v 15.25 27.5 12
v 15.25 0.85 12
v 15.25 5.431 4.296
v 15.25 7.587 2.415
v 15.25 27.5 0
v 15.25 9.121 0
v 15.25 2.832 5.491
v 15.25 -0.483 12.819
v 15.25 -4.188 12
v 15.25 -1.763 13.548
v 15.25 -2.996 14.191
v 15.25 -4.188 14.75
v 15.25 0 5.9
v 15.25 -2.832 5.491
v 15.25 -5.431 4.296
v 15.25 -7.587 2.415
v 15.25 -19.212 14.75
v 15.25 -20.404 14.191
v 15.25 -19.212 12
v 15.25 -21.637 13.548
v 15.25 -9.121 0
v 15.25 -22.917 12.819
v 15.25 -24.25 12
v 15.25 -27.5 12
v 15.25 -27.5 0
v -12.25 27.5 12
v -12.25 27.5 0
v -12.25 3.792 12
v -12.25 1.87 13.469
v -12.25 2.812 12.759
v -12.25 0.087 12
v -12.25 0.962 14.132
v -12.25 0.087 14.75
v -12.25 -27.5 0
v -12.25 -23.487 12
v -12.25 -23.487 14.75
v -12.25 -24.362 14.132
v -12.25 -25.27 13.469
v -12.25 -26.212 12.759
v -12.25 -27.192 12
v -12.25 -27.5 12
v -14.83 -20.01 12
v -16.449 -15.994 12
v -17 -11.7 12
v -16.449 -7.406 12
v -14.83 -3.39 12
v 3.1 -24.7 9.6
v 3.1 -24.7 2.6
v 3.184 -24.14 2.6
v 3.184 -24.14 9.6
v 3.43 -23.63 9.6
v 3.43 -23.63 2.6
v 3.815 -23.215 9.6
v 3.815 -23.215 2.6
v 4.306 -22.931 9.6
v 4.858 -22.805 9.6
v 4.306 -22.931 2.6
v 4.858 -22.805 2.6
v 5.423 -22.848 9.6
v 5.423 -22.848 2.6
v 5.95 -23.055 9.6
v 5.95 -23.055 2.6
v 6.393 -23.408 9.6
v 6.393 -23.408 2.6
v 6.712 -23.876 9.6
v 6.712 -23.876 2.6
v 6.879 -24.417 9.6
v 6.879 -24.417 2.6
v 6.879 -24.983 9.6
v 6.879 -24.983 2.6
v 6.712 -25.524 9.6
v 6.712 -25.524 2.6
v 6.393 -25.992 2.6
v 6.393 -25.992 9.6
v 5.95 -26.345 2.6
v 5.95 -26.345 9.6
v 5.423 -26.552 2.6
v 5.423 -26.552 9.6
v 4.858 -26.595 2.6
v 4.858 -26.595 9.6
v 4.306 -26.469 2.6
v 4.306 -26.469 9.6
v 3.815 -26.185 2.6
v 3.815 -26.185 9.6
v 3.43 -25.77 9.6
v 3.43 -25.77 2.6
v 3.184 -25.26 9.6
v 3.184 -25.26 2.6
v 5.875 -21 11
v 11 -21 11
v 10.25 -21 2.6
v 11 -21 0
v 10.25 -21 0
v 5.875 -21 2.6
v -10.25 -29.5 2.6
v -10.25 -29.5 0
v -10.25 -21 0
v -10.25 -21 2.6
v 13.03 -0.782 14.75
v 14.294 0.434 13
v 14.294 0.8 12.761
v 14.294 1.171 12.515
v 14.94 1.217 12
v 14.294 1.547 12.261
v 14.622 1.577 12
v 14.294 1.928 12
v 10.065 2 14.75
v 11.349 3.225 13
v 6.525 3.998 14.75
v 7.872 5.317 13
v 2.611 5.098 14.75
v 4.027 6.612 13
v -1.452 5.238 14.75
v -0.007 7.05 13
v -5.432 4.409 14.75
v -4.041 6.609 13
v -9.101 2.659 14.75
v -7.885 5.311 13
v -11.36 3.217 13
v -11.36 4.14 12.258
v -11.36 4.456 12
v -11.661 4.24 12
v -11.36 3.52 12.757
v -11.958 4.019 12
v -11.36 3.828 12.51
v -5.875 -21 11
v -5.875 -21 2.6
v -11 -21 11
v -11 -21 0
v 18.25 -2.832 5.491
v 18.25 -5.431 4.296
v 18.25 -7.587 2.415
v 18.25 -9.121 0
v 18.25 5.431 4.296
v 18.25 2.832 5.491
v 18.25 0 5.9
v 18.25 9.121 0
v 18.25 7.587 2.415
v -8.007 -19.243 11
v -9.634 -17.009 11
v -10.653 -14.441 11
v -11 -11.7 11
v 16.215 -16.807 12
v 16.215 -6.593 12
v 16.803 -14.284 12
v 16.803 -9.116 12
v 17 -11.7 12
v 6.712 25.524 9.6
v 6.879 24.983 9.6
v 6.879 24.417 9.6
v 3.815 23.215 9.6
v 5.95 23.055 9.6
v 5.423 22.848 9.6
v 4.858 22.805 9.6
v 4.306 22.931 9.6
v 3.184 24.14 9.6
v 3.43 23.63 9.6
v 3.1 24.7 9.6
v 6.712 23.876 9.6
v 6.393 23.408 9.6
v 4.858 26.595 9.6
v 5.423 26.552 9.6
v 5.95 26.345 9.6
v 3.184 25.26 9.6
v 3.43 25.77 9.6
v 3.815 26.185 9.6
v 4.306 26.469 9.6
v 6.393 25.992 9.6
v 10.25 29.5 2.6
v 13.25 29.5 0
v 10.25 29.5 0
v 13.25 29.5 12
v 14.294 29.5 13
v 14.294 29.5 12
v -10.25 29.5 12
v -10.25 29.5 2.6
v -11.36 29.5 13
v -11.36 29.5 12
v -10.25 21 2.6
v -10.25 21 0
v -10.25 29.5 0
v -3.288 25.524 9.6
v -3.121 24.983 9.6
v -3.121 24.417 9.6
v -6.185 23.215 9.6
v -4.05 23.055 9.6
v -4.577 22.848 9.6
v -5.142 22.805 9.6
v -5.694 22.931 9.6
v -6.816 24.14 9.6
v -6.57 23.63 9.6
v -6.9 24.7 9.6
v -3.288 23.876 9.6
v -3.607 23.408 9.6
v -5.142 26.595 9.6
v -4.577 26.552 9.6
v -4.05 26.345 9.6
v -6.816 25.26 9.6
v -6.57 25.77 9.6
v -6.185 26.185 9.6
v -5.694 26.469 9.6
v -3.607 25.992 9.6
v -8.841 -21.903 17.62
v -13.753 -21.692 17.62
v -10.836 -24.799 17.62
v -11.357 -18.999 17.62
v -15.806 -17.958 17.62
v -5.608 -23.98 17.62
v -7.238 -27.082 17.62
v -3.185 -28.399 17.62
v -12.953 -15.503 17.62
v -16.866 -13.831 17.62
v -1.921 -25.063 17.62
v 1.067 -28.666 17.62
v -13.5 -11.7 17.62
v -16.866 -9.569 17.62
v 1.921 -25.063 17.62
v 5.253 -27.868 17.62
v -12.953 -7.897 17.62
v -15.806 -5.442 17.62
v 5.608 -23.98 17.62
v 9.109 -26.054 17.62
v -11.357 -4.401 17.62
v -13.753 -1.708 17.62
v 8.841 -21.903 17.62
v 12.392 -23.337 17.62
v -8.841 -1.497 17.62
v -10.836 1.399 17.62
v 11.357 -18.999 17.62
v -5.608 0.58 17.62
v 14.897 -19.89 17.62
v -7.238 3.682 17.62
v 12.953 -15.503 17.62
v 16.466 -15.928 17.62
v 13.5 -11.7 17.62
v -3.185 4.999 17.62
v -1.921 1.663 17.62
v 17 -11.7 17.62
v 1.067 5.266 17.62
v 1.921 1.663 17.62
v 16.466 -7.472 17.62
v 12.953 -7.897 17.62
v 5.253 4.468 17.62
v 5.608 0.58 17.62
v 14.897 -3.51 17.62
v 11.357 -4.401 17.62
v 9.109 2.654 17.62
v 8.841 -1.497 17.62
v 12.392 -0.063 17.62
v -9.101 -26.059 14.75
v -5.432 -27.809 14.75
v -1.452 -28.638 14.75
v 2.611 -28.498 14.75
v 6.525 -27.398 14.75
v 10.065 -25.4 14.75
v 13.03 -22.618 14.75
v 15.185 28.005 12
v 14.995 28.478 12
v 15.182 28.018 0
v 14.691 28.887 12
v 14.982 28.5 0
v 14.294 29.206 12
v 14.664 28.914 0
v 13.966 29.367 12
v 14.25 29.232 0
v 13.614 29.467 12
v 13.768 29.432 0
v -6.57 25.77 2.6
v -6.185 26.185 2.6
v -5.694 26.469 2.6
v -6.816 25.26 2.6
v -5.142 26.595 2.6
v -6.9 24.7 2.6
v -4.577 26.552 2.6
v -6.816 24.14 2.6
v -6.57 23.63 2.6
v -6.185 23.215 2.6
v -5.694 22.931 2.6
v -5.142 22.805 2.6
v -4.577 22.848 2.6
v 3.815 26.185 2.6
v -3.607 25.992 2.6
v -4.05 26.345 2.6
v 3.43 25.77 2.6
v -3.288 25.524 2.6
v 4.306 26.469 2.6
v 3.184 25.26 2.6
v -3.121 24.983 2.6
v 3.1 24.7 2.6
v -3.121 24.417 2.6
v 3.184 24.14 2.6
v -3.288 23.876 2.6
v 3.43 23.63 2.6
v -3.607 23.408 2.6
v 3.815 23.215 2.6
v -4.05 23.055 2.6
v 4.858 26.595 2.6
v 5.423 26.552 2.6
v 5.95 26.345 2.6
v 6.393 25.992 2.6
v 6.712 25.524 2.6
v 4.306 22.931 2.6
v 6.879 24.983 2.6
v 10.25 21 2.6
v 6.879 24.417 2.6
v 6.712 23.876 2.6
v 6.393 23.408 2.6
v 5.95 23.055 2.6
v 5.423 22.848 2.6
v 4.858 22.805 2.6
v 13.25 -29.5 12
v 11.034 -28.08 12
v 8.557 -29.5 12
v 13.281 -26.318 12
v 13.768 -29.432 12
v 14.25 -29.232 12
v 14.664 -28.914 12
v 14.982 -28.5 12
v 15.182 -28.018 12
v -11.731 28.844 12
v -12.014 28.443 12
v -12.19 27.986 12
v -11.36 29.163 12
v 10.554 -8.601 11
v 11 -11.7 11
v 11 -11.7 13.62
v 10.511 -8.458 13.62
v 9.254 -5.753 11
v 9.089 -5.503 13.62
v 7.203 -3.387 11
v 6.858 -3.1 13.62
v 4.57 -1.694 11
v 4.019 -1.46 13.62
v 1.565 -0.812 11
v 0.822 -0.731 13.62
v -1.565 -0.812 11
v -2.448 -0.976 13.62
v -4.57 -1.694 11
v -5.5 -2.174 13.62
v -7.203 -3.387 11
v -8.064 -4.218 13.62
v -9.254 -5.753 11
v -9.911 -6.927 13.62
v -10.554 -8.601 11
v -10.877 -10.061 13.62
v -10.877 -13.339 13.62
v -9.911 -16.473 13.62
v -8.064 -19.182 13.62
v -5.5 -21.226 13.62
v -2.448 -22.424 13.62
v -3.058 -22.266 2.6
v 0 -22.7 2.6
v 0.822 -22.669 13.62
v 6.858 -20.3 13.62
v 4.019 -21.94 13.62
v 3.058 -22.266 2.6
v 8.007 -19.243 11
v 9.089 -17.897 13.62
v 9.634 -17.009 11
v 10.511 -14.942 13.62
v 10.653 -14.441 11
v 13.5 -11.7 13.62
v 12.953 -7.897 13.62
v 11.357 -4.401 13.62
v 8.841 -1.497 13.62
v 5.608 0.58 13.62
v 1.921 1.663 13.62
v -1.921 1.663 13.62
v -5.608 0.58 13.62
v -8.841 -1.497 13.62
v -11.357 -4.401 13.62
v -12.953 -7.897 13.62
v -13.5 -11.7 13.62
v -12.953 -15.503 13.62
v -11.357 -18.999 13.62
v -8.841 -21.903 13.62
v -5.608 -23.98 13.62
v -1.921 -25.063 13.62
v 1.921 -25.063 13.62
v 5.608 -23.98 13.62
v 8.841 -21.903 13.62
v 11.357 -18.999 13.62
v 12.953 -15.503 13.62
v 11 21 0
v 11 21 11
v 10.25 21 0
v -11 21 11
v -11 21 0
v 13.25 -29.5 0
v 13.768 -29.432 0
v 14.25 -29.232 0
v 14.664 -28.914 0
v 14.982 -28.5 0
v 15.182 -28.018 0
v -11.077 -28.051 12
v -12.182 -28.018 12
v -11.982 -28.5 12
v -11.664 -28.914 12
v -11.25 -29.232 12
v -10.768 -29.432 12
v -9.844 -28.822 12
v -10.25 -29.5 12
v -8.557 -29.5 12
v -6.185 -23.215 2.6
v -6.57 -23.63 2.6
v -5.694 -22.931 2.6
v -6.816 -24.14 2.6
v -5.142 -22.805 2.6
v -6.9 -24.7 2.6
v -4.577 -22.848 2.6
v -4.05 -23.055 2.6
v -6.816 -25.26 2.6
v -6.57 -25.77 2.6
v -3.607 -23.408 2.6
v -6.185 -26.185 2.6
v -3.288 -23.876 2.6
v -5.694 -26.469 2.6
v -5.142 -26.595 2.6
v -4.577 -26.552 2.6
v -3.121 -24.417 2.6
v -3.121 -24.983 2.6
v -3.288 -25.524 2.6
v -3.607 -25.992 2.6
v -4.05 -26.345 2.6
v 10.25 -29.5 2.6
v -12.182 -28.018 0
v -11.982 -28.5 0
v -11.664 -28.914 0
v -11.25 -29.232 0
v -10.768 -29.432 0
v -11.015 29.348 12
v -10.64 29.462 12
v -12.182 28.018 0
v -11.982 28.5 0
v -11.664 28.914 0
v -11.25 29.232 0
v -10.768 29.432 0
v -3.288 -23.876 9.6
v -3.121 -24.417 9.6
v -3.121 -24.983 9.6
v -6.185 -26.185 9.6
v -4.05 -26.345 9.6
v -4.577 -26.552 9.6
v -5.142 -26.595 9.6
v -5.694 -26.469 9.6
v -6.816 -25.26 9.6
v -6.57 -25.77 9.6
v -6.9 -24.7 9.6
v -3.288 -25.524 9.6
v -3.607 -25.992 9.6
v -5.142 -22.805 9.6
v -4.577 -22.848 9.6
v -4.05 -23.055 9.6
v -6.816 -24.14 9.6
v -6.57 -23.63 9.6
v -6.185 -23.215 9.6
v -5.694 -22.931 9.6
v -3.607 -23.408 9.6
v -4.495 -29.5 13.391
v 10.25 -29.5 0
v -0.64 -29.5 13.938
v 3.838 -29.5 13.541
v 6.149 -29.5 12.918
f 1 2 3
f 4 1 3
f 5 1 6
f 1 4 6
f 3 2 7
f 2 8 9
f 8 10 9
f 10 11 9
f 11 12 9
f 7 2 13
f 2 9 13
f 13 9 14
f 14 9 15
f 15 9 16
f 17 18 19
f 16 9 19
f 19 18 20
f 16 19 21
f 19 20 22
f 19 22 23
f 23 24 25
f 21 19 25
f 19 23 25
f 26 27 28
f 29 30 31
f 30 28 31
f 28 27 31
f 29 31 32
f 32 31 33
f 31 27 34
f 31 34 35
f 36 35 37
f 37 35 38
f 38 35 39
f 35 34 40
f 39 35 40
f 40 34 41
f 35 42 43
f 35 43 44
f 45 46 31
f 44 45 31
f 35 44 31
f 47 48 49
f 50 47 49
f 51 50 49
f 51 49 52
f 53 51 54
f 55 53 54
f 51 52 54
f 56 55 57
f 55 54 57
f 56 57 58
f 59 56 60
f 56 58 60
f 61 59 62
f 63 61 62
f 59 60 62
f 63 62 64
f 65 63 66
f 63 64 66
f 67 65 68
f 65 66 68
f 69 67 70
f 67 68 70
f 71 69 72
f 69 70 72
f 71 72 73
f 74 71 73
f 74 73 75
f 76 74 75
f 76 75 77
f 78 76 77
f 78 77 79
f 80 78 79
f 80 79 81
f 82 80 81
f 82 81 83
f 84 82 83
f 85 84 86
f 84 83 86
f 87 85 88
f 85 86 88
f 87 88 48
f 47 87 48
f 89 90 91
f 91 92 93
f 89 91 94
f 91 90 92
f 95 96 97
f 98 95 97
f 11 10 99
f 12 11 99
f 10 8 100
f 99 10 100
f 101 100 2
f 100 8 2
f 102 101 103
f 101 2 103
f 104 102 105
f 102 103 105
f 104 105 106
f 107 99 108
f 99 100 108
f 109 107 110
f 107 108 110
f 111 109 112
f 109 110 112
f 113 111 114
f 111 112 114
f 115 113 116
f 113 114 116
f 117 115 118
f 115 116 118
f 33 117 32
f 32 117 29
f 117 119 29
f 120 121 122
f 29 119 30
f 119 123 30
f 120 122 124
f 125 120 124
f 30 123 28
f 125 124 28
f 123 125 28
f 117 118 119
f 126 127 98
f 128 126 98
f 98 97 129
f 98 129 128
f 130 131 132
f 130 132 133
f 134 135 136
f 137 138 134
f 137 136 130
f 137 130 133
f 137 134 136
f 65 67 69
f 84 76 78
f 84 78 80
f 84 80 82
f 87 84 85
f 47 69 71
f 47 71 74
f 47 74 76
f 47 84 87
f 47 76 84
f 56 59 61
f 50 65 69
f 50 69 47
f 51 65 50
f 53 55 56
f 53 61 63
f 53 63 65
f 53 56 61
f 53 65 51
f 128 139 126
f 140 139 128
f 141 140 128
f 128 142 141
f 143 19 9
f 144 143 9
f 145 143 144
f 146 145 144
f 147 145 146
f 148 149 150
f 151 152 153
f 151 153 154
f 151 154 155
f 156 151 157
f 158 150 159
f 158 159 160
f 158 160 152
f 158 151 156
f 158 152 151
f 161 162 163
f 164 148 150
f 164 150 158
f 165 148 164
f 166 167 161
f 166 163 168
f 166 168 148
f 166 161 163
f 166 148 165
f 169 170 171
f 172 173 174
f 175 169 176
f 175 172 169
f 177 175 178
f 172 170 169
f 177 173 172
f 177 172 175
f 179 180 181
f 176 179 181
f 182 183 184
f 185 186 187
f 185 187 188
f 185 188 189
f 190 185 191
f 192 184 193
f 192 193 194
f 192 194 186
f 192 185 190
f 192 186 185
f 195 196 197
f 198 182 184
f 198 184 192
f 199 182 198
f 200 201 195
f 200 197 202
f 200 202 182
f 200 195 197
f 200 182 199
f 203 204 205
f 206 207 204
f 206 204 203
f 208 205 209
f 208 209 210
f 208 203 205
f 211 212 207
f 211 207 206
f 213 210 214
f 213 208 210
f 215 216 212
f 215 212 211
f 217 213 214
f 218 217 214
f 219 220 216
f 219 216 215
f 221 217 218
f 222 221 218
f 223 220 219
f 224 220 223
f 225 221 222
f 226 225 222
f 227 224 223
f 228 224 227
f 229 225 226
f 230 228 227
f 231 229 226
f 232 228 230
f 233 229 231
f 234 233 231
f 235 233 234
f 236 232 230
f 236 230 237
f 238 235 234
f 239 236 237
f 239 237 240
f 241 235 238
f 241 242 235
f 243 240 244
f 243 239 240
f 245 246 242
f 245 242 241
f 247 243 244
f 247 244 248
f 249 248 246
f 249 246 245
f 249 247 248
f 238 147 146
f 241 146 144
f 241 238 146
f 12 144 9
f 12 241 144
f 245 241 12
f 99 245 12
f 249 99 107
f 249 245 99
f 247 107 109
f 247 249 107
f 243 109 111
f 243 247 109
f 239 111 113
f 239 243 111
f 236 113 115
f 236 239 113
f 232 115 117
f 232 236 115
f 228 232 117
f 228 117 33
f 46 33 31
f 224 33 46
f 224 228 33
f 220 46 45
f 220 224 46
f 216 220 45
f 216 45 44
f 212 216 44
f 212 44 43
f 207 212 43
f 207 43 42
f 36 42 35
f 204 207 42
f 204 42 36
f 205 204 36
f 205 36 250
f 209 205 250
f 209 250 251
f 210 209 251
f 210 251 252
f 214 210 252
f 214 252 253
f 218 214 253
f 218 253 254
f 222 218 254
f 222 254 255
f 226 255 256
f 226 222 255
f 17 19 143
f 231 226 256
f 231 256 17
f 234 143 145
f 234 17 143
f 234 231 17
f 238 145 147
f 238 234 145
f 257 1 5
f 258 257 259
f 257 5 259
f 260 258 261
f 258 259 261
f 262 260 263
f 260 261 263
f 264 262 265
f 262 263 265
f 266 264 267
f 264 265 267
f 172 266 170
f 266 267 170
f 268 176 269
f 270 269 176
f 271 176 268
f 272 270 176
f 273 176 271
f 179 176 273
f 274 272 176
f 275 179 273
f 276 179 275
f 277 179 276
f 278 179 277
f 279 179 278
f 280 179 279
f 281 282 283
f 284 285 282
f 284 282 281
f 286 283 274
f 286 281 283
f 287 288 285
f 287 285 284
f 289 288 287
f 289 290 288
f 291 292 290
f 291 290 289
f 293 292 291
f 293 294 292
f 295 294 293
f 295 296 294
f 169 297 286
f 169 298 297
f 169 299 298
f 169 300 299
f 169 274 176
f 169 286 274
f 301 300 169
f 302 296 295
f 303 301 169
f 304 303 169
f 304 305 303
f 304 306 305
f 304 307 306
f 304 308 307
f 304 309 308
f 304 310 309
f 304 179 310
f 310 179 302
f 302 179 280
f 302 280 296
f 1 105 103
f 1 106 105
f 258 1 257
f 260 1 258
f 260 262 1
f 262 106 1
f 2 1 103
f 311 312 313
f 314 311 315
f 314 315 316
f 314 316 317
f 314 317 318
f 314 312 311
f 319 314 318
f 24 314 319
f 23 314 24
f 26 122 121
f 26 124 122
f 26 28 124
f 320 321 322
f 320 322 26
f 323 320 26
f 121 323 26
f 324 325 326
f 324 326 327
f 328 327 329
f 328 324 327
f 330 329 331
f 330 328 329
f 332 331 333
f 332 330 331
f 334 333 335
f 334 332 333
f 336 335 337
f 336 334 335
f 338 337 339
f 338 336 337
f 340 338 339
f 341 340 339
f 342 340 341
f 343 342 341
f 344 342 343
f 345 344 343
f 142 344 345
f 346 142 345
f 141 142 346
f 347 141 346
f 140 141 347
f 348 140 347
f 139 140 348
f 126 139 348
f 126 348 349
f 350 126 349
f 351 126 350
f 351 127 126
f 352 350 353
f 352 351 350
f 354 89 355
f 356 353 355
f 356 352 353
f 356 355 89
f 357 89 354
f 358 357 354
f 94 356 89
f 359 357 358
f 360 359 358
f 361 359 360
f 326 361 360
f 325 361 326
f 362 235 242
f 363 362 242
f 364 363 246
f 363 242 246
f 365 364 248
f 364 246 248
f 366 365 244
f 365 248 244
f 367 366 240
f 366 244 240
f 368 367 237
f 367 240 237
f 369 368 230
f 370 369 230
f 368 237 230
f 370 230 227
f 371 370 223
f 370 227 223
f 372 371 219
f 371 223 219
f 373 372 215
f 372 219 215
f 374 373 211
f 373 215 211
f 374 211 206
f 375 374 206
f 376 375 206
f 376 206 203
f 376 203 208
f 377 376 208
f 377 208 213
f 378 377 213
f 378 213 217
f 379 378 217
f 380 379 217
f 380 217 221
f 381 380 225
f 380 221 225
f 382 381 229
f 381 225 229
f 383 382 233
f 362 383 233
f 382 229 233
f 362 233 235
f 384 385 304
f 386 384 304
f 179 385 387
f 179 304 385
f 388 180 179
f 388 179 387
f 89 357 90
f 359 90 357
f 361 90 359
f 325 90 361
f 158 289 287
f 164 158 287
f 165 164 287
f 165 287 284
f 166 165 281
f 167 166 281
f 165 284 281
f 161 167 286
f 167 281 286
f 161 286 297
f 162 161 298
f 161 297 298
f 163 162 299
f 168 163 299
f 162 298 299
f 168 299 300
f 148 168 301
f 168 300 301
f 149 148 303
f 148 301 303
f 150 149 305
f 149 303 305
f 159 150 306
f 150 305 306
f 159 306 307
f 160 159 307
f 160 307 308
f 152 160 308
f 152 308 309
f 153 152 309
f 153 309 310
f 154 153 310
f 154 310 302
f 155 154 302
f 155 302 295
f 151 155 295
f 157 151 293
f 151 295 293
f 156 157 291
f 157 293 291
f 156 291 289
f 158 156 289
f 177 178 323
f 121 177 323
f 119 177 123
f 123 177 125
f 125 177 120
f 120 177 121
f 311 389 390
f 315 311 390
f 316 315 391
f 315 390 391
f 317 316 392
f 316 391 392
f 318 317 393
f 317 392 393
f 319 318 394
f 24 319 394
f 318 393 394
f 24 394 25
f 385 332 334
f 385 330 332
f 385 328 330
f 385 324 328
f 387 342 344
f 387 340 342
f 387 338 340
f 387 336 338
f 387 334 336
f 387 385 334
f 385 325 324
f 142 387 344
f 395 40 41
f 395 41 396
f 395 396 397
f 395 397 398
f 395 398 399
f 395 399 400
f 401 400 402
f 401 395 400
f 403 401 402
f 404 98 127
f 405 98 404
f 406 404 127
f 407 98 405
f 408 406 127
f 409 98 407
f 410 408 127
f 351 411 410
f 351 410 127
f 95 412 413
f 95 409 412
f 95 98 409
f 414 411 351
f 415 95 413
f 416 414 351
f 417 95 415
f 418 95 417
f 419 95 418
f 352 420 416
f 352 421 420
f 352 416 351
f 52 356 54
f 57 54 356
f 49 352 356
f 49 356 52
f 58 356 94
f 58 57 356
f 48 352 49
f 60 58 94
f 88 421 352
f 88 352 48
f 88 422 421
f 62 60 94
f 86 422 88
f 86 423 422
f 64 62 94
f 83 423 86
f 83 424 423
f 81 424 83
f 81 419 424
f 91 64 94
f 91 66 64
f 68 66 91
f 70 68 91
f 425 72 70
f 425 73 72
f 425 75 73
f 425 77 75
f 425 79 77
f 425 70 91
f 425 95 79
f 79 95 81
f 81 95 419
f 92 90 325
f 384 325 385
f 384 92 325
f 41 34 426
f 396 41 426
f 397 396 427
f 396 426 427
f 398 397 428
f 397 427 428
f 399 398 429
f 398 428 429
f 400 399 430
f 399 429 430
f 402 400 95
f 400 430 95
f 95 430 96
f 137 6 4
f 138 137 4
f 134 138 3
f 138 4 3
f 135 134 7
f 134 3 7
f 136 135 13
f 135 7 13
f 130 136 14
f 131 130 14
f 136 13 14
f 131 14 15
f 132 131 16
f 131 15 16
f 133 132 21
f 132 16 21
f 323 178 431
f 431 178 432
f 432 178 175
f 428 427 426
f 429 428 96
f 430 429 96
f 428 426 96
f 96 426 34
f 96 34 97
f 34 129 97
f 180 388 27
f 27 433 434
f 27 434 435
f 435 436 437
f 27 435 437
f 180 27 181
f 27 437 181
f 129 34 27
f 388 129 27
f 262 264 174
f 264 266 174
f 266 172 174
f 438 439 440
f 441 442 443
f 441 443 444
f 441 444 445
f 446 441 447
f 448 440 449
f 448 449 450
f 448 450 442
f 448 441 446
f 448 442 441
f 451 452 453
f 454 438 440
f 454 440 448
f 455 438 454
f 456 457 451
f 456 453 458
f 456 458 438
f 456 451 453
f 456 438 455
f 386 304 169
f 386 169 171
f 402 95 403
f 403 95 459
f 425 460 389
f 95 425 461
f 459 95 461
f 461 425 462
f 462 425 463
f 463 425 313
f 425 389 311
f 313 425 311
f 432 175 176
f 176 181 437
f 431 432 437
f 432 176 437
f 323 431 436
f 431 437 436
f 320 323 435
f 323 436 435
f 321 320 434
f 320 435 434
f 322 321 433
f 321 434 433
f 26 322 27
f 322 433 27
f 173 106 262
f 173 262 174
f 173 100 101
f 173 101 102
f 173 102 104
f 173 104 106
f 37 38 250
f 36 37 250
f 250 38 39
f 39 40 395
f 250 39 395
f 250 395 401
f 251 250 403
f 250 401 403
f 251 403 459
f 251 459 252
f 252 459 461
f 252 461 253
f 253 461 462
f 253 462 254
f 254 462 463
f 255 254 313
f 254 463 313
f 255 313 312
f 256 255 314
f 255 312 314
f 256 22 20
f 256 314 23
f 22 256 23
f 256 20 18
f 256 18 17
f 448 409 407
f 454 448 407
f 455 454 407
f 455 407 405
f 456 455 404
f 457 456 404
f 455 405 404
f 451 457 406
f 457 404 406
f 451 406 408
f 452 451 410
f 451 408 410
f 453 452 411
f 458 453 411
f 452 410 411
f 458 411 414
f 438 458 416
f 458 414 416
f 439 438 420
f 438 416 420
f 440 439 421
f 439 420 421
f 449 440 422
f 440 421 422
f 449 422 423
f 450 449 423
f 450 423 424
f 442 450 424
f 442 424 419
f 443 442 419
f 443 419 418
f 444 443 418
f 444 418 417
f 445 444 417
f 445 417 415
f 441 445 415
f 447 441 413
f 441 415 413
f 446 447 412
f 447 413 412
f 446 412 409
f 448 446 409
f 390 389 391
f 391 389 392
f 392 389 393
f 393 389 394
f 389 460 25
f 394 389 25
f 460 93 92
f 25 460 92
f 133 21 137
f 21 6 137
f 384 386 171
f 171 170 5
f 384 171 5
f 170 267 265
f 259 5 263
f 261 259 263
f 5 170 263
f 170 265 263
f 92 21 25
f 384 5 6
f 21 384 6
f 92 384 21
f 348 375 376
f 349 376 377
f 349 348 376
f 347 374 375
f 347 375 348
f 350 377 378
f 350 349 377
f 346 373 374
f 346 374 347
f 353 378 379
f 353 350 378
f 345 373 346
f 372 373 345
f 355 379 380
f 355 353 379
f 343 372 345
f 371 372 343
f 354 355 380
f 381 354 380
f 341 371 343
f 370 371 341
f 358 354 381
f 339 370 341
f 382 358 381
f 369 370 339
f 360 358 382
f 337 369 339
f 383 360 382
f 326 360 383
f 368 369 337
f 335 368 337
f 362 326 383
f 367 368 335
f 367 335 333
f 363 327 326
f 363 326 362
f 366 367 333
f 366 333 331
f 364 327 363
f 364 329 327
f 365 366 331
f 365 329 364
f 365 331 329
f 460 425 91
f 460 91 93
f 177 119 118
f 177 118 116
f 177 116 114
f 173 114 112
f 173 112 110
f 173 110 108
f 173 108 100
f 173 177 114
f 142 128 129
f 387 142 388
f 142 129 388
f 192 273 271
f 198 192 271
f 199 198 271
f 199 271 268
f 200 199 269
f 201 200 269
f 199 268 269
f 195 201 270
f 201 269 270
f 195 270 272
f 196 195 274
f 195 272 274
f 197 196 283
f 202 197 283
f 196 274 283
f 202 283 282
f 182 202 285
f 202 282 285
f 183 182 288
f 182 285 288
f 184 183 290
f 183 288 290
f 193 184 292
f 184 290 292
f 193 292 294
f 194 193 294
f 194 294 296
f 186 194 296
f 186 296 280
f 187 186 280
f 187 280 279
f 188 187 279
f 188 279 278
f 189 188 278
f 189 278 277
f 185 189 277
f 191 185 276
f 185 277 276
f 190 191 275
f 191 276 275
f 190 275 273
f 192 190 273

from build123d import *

# Parameters (mm, degrees)
BOSS_EXTRUDE1_DEPTH      = 11
CUT_EXTRUDE1_DEPTH       = 62.923844357
CUT_EXTRUDE1_DEPTH_BACK  = 62.923844357
SKETCH2_W                = 20.5
SKETCH2_H                = 2.6
BOSS_EXTRUDE3_START      = -8.4
BOSS_EXTRUDE3_DEPTH      = 9.4
SKETCH4_R                = 17
SKETCH4_R_2              = 10
BOSS_EXTRUDE2_DEPTH      = 5.62
SKETCH5_R                = 13.5
CUT_EXTRUDE2_DEPTH       = 4
CUT_EXTRUDE3_DEPTH       = 37.67089309
CUT_EXTRUDE3_DEPTH_BACK  = 37.67089309
SKETCH6_R                = 10.5
BOSS_EXTRUDE4_START      = 1.12
SKETCH18_R               = 17
BOSS_EXTRUDE4_DEPTH      = 1.12
CHAMFER3_SIZE            = 2.75
BOSS_EXTRUDE7_START      = 1
BOSS_EXTRUDE7_DEPTH      = 1
CUT_EXTRUDE17_START      = 12
SKETCH28_W               = 22
SKETCH28_H               = 42
CUT_EXTRUDE17_DEPTH      = 11
CUT_EXTRUDE18_DEPTH      = 37.488140539
CUT_EXTRUDE18_DEPTH_BACK = 37.488140539
SKETCH29_R               = 11
SKETCH31_R               = 1.9
CUT_EXTRUDE19_DEPTH      = 7
BOSS_EXTRUDE8_DEPTH      = 3


with BuildPart() as part:
    # Sketch1 → Boss-Extrude1 (new body)
    with BuildSketch(Plane.XY):
        with BuildLine():
            ThreePointArc((15.25, 27.5), (14.664213562, 28.914213562), (13.25, 29.5))
            Line((13.25, 29.5), (-10.25, 29.5))
            ThreePointArc((-10.25, 29.5), (-11.664213562, 28.914213562), (-12.25, 27.5))
            Line((-12.25, 27.5), (-12.25, 0.346410162))
            Line((-12.25, 0.346410162), (-12.25, 0))
            Line((-12.25, 0), (-12.25, -0.346410162))
            Line((-12.25, -0.346410162), (-12.25, -27.5))
            ThreePointArc((-12.25, -27.5), (-11.664213562, -28.914213562), (-10.25, -29.5))
            Line((-10.25, -29.5), (13.25, -29.5))
            ThreePointArc((13.25, -29.5), (14.664213562, -28.914213562), (15.25, -27.5))
            Line((15.25, -27.5), (15.25, -9.120855223))
            Line((15.25, -9.120855223), (15.25, 9.120855223))
            Line((15.25, 9.120855223), (15.25, 27.5))
        make_face()
        with BuildLine():
            Line((7, 22.5), (10.25, 22.5))
            Line((10.25, 22.5), (10.25, -22.5))
            Line((10.25, -22.5), (7, -22.5))
            Line((7, -22.5), (7, -24.7))
            ThreePointArc((7, -24.7), (5, -26.7), (3, -24.7))
            Line((3, -24.7), (3, -22.5))
            Line((3, -22.5), (-3, -22.5))
            Line((-3, -22.5), (-3, -24.7))
            ThreePointArc((-3, -24.7), (-5, -26.7), (-7, -24.7))
            Line((-7, -24.7), (-7, -22.5))
            Line((-7, -22.5), (-10.25, -22.5))
            Line((-10.25, -22.5), (-10.25, 22.5))
            Line((-10.25, 22.5), (-7, 22.5))
            Line((-7, 22.5), (-7, 24.7))
            ThreePointArc((-7, 24.7), (-5, 26.7), (-3, 24.7))
            Line((-3, 24.7), (-3, 22.5))
            Line((-3, 22.5), (3, 22.5))
            Line((3, 22.5), (3, 24.7))
            ThreePointArc((3, 24.7), (5, 26.7), (7, 24.7))
            Line((7, 24.7), (7, 22.5))
        make_face(mode=Mode.SUBTRACT)
    extrude(amount=BOSS_EXTRUDE1_DEPTH)

    # Sketch2 → Cut-Extrude1 (cut, two sides: drawn at the far end of the back side and taken through both)
    with BuildSketch(Plane(origin=(0, 29.5, 0), x_dir=(1, 0, 0), z_dir=(0, 1, 0)).offset(-CUT_EXTRUDE1_DEPTH_BACK)):
        with Locations((0, -1.3)):
            Rectangle(SKETCH2_W, SKETCH2_H)
    extrude(amount=CUT_EXTRUDE1_DEPTH + CUT_EXTRUDE1_DEPTH_BACK, mode=Mode.SUBTRACT)

    # Sketch3 → Boss-Extrude3 (add)
    with BuildSketch(Plane.XY.offset(11).offset(BOSS_EXTRUDE3_START)):
        with BuildLine():
            Line((-10.25, -29.5), (13.25, -29.5))
            ThreePointArc((13.25, -29.5), (14.664213562, -28.914213562), (15.25, -27.5))
            Line((15.25, -27.5), (15.25, 27.5))
            ThreePointArc((15.25, 27.5), (14.664213562, 28.914213562), (13.25, 29.5))
            Line((13.25, 29.5), (-10.25, 29.5))
            ThreePointArc((-10.25, 29.5), (-11.664213562, 28.914213562), (-12.25, 27.5))
            Line((-12.25, 27.5), (-12.25, -27.5))
            ThreePointArc((-12.25, -27.5), (-11.664213562, -28.914213562), (-10.25, -29.5))
        make_face()
    extrude(amount=BOSS_EXTRUDE3_DEPTH)

    # Sketch4 → Boss-Extrude2 (add)
    with BuildSketch(Plane.XY.offset(17.62)):
        with Locations((0, -11.7)):
            Circle(SKETCH4_R)
        with Locations((0, -11.7)):
            Circle(SKETCH4_R_2, mode=Mode.SUBTRACT)
    extrude(amount=-BOSS_EXTRUDE2_DEPTH)

    # Sketch5 → Cut-Extrude2 (cut)
    with BuildSketch(Plane.XY.offset(17.62)):
        with Locations((0, -11.7)):
            Circle(SKETCH5_R)
    extrude(amount=-CUT_EXTRUDE2_DEPTH, mode=Mode.SUBTRACT)

    # Sketch6 → Cut-Extrude3 (cut, two sides: drawn at the far end of the back side and taken through both)
    with BuildSketch(Plane.XY.offset(13.62).offset(-CUT_EXTRUDE3_DEPTH_BACK)):
        with Locations((0, -11.7)):
            Circle(SKETCH6_R)
    extrude(amount=CUT_EXTRUDE3_DEPTH + CUT_EXTRUDE3_DEPTH_BACK, mode=Mode.SUBTRACT)

    # Sketch18 → Boss-Extrude4 (add)
    with BuildSketch(Plane.XY.offset(12).offset(BOSS_EXTRUDE4_START)):
        with Locations((0, -11.7)):
            Circle(SKETCH18_R)
    extrude(amount=-BOSS_EXTRUDE4_DEPTH)

    # Chamfer3
    # the kernel refuses this chamfer: 2.75 mm, written as the material it adds along each edge
    with BuildSketch(Plane(origin=(0, -11.7, 12), x_dir=(0.99914018616096, 0.041459478991448445, 0), z_dir=(0.041459478991448445, -0.99914018616096, 0))) as chamfer3_piece_1_section:
        Polygon((17, CHAMFER3_SIZE), (17 + CHAMFER3_SIZE, 0), (17, 0), align=None)
    chamfer3_piece_1 = revolve(axis=Axis((0, -11.7, 12), (0, 0, 1)), revolution_arc=157.576683104, mode=Mode.PRIVATE)
    chamfer3_piece_1 = split(chamfer3_piece_1, bisect_by=Plane(origin=(15.25, 6.422467161, 13.340102963), z_dir=(-1, 0, 0)), keep=Keep.TOP, mode=Mode.PRIVATE)
    chamfer3_piece_1 = split(chamfer3_piece_1, bisect_by=Plane(origin=(-12.25, 6.422467161, 13.340102963), z_dir=(1, 0, 0)), keep=Keep.TOP, mode=Mode.PRIVATE)
    add(chamfer3_piece_1)
    with BuildSketch(Plane(origin=(0, -11.7, 12), x_dir=(-0.9394106509692863, -0.3427938576542199, 0), z_dir=(-0.3427938576542199, 0.9394106509692863, 0))) as chamfer3_piece_2_section:
        Polygon((17, CHAMFER3_SIZE), (17 + CHAMFER3_SIZE, 0), (17, 0), align=None)
    chamfer3_piece_2 = revolve(axis=Axis((0, -11.7, 12), (0, 0, 1)), revolution_arc=157.576683104, mode=Mode.PRIVATE)
    chamfer3_piece_2 = split(chamfer3_piece_2, bisect_by=Plane(origin=(15.25, -27.115392877, 14.25853692), z_dir=(-1, 0, 0)), keep=Keep.TOP, mode=Mode.PRIVATE)
    chamfer3_piece_2 = split(chamfer3_piece_2, bisect_by=Plane(origin=(-12.25, -27.115392877, 14.25853692), z_dir=(1, 0, 0)), keep=Keep.TOP, mode=Mode.PRIVATE)
    chamfer3_piece_2 = split(chamfer3_piece_2, bisect_by=Plane(origin=(-8.124246578, -29.5, 14.25853692), z_dir=(0, 1, 0)), keep=Keep.TOP, mode=Mode.PRIVATE)
    add(chamfer3_piece_2)

    # Sketch19 → Boss-Extrude7 (add)
    with BuildSketch(Plane.XY.offset(12).offset(BOSS_EXTRUDE7_START)):
        with BuildLine():
            Line((-11.360440511, 29.5), (-11.360440511, 0.946754184))
            ThreePointArc((-11.360440511, 0.946754184), (2.262558078, 5.148763484), (14.294383554, -2.498337172))
            Line((14.294383554, -2.498337172), (14.294383554, 29.5))
            Line((14.294383554, 29.5), (-11.360440511, 29.5))
        make_face()
    extrude(amount=-BOSS_EXTRUDE7_DEPTH)

    # Sketch28 → Cut-Extrude17 (cut)
    with BuildSketch(Plane(origin=(0, 0, 12), x_dir=(-1, 0, 0), z_dir=(0, 0, -1)).offset(CUT_EXTRUDE17_START)):
        Rectangle(SKETCH28_W, SKETCH28_H)
    extrude(amount=-CUT_EXTRUDE17_DEPTH, mode=Mode.SUBTRACT)

    # Sketch29 → Cut-Extrude18 (cut, two sides: drawn at the far end of the back side and taken through both)
    with BuildSketch(Plane.XY.offset(13.12).offset(-CUT_EXTRUDE18_DEPTH_BACK)):
        with Locations((0, -11.7)):
            Circle(SKETCH29_R)
    extrude(amount=CUT_EXTRUDE18_DEPTH + CUT_EXTRUDE18_DEPTH_BACK, mode=Mode.SUBTRACT)

    # Sketch31 → Cut-Extrude19 (cut)
    with BuildSketch(Plane(origin=(0, 0, 2.6), x_dir=(-1, 0, 0), z_dir=(0, 0, -1))):
        with Locations((5, 24.7)):
            Circle(SKETCH31_R)
        with Locations((-5, 24.7)):
            Circle(SKETCH31_R)
        with Locations((-5, -24.7)):
            Circle(SKETCH31_R)
        with Locations((5, -24.7)):
            Circle(SKETCH31_R)
    extrude(amount=-CUT_EXTRUDE19_DEPTH, mode=Mode.SUBTRACT)

    # Sketch35 → Boss-Extrude8 (add)
    with BuildSketch(Plane(origin=(15.25, 0, 0), x_dir=(0, 0, -1), z_dir=(1, 0, 0))):
        with BuildLine():
            Line((0, -9.120855223), (0, 9.120855223))
            ThreePointArc((0, 9.120855223), (-5.9, 0), (0, -9.120855223))
        make_face()
    extrude(amount=BOSS_EXTRUDE8_DEPTH)


solid = part.part
